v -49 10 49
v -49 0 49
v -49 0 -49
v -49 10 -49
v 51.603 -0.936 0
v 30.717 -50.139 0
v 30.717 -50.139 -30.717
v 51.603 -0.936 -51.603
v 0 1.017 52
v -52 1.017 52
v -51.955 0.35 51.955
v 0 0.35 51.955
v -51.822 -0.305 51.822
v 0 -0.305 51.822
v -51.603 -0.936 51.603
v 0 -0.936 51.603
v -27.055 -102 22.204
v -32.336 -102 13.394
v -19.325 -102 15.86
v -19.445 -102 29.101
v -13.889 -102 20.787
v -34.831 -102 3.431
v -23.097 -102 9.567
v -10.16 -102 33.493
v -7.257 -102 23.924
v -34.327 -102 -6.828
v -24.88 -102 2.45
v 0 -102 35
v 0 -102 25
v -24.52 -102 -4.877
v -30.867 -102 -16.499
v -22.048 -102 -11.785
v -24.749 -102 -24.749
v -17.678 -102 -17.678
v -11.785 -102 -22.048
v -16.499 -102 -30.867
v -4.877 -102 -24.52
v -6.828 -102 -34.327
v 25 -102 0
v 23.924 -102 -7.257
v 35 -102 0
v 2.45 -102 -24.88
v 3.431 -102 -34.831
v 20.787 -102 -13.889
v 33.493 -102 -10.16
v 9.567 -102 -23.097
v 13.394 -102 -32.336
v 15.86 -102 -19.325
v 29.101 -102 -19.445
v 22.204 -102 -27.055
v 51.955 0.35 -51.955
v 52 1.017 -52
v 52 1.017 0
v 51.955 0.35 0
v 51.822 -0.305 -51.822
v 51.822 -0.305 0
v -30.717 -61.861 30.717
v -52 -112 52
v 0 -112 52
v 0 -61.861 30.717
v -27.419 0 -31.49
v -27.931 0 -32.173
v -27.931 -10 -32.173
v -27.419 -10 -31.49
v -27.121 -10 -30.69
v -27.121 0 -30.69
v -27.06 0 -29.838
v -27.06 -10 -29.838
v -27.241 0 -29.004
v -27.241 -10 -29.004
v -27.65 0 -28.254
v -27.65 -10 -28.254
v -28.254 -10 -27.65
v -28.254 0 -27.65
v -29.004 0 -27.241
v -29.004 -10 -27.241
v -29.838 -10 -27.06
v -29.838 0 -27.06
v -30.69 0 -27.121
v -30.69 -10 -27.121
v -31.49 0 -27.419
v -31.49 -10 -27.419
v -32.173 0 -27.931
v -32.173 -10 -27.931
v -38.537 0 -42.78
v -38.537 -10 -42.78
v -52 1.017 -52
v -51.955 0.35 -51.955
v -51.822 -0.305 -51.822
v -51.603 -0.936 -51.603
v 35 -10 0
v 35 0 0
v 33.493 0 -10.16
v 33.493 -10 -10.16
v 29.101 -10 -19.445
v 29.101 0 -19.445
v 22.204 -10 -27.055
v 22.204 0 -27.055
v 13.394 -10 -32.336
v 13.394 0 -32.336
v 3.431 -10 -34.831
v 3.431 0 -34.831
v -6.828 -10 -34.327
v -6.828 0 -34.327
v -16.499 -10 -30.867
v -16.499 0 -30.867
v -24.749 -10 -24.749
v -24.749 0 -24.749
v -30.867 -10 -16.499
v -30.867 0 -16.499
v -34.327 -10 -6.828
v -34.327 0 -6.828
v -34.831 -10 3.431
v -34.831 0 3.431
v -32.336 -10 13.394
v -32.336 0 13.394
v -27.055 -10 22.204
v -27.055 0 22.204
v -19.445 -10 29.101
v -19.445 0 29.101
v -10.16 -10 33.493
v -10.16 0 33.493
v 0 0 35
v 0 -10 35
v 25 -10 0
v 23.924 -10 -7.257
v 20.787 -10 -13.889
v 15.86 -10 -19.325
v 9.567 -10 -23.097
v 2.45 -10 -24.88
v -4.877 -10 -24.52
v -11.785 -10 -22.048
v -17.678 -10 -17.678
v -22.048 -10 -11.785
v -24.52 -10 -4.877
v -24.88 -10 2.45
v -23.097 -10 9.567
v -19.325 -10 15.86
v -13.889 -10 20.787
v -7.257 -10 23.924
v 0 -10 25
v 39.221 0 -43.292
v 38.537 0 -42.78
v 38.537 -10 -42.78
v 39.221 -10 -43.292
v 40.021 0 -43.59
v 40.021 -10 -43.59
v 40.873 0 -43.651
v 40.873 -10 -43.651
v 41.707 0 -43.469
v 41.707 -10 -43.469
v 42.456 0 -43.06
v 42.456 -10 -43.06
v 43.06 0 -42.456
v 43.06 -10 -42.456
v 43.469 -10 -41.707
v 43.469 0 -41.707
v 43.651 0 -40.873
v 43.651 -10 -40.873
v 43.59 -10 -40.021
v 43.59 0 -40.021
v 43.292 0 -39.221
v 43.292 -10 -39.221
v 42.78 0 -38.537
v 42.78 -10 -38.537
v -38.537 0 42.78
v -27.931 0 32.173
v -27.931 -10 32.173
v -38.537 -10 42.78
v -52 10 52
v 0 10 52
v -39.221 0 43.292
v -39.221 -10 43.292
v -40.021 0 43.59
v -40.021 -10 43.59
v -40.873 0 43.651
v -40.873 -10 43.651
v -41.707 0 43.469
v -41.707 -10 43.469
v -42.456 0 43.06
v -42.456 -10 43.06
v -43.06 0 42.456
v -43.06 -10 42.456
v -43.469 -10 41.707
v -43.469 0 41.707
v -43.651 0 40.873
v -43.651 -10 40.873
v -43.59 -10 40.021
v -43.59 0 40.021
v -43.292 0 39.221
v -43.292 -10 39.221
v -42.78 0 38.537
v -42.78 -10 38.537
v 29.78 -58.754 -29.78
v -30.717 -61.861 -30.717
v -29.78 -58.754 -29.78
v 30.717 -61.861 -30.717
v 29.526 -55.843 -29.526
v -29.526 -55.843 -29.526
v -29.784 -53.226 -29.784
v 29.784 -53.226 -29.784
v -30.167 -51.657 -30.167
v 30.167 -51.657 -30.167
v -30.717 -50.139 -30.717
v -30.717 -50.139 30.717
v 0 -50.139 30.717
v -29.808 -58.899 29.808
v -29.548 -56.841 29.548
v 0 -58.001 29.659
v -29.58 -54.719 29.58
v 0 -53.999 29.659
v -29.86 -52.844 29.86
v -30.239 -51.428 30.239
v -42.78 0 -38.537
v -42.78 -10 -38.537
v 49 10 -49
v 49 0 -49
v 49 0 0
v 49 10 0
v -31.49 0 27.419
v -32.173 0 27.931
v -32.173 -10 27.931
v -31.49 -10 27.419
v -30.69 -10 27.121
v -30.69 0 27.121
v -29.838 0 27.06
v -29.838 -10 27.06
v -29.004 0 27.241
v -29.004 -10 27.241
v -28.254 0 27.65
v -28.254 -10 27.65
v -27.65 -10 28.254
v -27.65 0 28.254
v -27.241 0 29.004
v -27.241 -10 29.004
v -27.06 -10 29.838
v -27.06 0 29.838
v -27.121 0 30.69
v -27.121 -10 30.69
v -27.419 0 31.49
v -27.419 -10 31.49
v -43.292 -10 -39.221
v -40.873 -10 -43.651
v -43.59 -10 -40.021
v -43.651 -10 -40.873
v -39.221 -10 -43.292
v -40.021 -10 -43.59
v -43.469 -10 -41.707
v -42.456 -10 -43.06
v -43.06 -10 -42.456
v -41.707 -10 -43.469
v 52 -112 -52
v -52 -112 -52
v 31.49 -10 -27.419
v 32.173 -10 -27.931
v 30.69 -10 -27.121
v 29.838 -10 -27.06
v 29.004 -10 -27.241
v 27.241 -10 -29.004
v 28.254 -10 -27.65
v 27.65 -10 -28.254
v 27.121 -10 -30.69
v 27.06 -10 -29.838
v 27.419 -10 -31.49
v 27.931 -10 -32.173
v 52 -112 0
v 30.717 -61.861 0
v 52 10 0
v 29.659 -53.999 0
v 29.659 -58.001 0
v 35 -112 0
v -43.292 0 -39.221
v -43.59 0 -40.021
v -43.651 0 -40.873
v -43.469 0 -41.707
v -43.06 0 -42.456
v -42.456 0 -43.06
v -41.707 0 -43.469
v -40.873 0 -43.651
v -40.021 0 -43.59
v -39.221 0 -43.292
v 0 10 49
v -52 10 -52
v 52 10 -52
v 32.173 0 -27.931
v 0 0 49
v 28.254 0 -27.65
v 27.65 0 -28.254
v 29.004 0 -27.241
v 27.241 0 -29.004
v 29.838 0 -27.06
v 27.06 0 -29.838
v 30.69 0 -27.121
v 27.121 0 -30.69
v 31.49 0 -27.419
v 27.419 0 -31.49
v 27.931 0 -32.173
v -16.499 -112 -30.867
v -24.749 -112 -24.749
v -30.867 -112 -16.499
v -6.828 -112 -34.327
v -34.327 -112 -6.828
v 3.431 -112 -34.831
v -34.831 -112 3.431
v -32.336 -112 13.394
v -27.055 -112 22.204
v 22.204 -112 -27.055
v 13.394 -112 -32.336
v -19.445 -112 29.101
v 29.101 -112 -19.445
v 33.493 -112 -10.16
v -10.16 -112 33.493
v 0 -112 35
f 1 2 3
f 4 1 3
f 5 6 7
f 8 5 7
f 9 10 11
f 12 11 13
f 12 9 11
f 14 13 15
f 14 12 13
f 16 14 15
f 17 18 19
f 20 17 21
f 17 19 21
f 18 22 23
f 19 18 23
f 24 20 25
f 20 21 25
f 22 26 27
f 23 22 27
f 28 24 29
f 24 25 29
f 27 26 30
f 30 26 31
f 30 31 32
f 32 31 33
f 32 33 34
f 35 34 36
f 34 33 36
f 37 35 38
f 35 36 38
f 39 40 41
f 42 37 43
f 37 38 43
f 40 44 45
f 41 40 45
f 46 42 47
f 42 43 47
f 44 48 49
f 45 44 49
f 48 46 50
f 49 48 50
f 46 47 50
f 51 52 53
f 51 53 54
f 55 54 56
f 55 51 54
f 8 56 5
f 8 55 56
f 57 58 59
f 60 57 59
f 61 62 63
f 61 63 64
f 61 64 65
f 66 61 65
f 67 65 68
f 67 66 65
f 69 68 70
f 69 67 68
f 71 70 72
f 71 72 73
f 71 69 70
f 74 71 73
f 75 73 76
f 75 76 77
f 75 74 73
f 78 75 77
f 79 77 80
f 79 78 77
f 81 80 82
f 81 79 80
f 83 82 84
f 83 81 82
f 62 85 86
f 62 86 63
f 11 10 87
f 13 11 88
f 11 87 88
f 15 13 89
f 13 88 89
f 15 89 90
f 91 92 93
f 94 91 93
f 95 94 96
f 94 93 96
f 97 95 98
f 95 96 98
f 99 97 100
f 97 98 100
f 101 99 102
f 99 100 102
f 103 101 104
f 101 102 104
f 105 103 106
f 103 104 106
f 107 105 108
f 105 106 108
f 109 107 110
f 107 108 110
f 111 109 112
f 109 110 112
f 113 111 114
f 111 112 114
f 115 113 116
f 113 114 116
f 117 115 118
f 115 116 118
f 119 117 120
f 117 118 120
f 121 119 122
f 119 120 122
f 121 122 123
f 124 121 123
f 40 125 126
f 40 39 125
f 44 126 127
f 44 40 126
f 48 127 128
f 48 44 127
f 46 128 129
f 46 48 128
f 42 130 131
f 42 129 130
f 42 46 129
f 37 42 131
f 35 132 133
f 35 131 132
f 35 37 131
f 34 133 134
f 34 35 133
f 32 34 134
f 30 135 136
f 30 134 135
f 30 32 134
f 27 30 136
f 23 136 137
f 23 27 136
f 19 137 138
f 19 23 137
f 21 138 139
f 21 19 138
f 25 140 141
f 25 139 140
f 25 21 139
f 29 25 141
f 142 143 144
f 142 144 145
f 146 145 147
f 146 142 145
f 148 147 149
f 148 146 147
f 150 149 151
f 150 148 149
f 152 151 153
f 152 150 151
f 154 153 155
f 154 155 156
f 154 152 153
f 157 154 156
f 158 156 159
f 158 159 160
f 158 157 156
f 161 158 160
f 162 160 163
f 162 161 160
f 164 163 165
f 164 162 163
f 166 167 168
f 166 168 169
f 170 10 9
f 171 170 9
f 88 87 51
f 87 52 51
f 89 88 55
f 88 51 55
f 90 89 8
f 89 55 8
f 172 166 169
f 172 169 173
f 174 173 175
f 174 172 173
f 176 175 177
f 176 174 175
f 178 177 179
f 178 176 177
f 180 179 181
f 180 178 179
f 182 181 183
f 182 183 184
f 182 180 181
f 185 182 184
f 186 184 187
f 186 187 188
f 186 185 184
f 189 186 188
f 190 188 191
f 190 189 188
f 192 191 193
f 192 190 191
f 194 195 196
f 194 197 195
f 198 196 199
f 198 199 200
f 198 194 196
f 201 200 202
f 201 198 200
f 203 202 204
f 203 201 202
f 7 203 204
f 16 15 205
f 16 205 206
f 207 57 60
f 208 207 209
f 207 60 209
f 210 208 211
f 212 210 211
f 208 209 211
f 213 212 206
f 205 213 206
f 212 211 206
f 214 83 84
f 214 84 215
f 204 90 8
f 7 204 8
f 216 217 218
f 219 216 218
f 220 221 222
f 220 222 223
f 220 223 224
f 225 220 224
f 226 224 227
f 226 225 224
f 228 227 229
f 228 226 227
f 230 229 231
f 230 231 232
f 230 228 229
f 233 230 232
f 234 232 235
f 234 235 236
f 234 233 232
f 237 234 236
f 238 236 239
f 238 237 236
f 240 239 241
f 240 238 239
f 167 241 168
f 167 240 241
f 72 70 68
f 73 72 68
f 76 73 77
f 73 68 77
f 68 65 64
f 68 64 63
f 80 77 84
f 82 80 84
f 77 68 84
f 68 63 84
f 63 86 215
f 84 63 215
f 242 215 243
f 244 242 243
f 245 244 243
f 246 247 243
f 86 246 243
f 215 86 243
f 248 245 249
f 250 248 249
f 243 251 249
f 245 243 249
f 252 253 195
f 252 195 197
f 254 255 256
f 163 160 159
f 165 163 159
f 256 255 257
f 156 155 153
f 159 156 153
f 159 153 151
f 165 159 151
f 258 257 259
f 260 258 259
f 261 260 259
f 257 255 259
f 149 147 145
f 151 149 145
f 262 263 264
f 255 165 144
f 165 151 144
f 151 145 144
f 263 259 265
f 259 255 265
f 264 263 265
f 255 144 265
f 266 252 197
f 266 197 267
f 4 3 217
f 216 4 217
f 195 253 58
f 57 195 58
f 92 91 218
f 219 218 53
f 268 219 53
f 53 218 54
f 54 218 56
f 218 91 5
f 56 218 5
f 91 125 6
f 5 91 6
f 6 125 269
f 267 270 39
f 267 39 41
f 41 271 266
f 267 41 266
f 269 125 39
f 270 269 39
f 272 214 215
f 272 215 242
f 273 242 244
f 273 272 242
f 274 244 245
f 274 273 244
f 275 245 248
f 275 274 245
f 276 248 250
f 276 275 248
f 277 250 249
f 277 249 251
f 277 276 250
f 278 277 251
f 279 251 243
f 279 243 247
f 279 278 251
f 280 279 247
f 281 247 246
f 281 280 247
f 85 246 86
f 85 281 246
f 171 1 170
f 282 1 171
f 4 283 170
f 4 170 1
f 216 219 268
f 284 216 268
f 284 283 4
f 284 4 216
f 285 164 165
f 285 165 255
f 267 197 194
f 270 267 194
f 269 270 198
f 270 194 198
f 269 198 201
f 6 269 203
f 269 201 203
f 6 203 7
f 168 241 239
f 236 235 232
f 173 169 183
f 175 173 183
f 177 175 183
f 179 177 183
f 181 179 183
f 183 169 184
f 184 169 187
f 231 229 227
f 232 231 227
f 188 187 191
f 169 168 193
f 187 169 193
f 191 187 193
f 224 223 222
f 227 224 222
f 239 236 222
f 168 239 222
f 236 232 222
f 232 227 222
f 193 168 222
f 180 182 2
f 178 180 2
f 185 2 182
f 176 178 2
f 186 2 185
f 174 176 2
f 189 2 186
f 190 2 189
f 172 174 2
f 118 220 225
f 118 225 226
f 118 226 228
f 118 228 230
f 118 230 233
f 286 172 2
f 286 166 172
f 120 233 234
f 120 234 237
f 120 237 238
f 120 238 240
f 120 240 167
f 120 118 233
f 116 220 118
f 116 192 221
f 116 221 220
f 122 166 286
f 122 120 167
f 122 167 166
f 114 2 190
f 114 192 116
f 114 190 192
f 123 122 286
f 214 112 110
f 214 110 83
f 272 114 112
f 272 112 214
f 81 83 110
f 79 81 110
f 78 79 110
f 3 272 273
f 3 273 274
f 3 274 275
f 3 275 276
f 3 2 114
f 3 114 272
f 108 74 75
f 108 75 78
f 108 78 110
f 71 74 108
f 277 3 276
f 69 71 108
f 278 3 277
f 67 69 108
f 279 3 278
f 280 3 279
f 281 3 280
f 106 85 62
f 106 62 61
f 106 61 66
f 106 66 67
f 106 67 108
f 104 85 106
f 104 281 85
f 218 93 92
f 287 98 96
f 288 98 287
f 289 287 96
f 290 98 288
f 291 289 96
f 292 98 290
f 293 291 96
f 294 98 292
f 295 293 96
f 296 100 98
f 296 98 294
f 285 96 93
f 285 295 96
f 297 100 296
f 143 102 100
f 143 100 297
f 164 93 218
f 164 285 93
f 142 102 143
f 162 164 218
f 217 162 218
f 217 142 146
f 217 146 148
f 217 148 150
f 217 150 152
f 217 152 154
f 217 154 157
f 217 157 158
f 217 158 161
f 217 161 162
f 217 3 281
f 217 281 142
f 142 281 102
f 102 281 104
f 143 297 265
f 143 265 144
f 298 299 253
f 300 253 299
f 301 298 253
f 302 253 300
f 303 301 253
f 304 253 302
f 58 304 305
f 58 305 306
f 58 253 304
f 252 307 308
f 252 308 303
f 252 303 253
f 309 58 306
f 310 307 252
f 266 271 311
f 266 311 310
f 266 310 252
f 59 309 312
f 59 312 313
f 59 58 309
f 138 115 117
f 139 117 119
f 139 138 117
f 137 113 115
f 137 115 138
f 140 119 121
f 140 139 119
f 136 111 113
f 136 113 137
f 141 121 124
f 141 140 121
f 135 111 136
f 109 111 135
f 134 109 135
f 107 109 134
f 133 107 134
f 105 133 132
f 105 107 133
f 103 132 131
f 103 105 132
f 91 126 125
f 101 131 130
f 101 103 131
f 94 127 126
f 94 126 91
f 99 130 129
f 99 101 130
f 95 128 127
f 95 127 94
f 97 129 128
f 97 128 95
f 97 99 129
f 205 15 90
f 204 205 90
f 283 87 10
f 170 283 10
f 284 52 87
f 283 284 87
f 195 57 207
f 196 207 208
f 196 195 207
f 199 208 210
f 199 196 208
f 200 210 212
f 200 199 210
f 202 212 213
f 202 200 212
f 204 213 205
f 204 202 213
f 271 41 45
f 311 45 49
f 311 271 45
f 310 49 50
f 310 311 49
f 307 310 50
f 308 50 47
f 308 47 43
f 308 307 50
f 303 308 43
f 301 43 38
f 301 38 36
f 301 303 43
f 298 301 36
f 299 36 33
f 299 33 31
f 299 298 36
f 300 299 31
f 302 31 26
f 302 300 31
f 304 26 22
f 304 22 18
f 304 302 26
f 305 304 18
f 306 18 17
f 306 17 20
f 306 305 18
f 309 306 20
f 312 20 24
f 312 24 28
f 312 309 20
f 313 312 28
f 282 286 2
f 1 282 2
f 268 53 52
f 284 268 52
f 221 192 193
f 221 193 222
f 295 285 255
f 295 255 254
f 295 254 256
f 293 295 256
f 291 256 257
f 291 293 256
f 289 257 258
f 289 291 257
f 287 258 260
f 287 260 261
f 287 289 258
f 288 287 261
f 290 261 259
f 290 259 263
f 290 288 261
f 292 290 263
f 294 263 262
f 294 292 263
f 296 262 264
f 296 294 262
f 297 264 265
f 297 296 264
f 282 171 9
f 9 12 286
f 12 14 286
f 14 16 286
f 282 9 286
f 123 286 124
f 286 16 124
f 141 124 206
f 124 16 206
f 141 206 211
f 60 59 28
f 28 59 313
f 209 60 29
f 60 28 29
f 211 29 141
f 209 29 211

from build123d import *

# Parameters (mm, degrees)
ESQUISSE1_W                  = 104
ESQUISSE1_H                  = 104
BOSS_EXTRU_2_DEPTH           = 56
BOSS_EXTRU_2_DRAFT           = -23
SYM_TRIE1_COPY_1_SKETCH_W    = 104
SYM_TRIE1_COPY_1_SKETCH_H    = 104
SYM_TRIE1_COPY_1_DEPTH       = 56
SYM_TRIE1_COPY_1_DRAFT       = -23
ENL_V_MAT_EXTRU_1_DEPTH      = 134.985073796
ENL_V_MAT_EXTRU_1_DEPTH_BACK = 134.985073796
ESQUISSE2_R                  = 25
CONG_1_R                     = 15
ESQUISSE3_W                  = 52
ESQUISSE3_H                  = 52
ENL_V_MAT_EXTRU_2_DEPTH      = 134.985073796
ESQUISSE4_R                  = 35
ENL_V_MAT_EXTRU_3_DEPTH      = 10
BOSS_EXTRU_3_DEPTH           = 10
CONG_2_R                     = 5
ENL_V_MAT_EXTRU_4_DEPTH      = 10


with BuildPart() as part:
    # Esquisse1 → Boss.-Extru.2 (with draft: the straight prism first)
    with BuildSketch(Plane(origin=(0, 0, 0), x_dir=(1, 0, 0), z_dir=(0, 1, 0))):
        Rectangle(ESQUISSE1_W, ESQUISSE1_H)
    extrude(amount=-BOSS_EXTRU_2_DEPTH)
    # Boss.-Extru.2: the draft: its side faces are tilted about the plane it starts from
    boss_extru_2_sides = [part.faces().sort_by_distance(p)[0] for p in [
        (-52, -28, 0),
        (0, -28, 52),
        (52, -28, 0),
        (0, -28, -52),
    ]]
    draft(boss_extru_2_sides, Plane(origin=(0, 0, 0), x_dir=(1, 0, 0), z_dir=(0, 1, 0)), BOSS_EXTRU_2_DRAFT)


with BuildPart() as sym_trie1_copy_1_tool:
    # Symétrie1 copy 1 sketch → Symétrie1 copy 1 (with draft: the straight prism first)
    with BuildSketch(Plane.XZ.offset(112)):
        Rectangle(SYM_TRIE1_COPY_1_SKETCH_W, SYM_TRIE1_COPY_1_SKETCH_H)
    extrude(amount=-SYM_TRIE1_COPY_1_DEPTH)
    # Symétrie1 copy 1: the draft: its side faces are tilted about the plane it starts from
    sym_trie1_copy_1_sides = [sym_trie1_copy_1_tool.faces().sort_by_distance(p)[0] for p in [
        (-52, -84, 0),
        (0, -84, 52),
        (52, -84, 0),
        (0, -84, -52),
    ]]
    draft(sym_trie1_copy_1_sides, Plane.XZ.offset(112), SYM_TRIE1_COPY_1_DRAFT)


with BuildPart() as part_1:
    add(part.part)

    # Symétrie1 copy 1: add sym_trie1_copy_1_tool
    add(sym_trie1_copy_1_tool.part)

    # Esquisse2 → Enlèv. mat.-Extru.1 (cut, two sides: drawn at the far end of the back side and taken through both)
    with BuildSketch(Plane(origin=(0, 0, 0), x_dir=(1, 0, 0), z_dir=(0, 1, 0)).offset(-ENL_V_MAT_EXTRU_1_DEPTH_BACK)):
        with Locations(Location((0, 0, 0), (0, 0, 270))):
            Circle(ESQUISSE2_R)
    extrude(amount=ENL_V_MAT_EXTRU_1_DEPTH + ENL_V_MAT_EXTRU_1_DEPTH_BACK, mode=Mode.SUBTRACT)

    # Congé1
    cong_1_edges = [part_1.edges().sort_by_distance(p)[0] for p in [
        (-28.229410292, -56, 0),
        (0, -56, 28.229410292),
        (28.229410292, -56, 0),
        (0, -56, -28.229410292),
    ]]
    fillet(cong_1_edges, radius=CONG_1_R)

    # Esquisse3 → Enlèv. mat.-Extru.2 (cut, through all)
    with BuildSketch(Plane(origin=(0, 0, 0), x_dir=(1, 0, 0), z_dir=(0, 1, 0))):
        with Locations((26, -26)):
            Rectangle(ESQUISSE3_W, ESQUISSE3_H)
    extrude(amount=-ENL_V_MAT_EXTRU_2_DEPTH, mode=Mode.SUBTRACT)

    # Esquisse4 → Enlèv. mat.-Extru.3 (cut)
    with BuildSketch(Plane(origin=(0, 0, 0), x_dir=(1, 0, 0), z_dir=(0, 1, 0))):
        Circle(ESQUISSE4_R)
    enl_v_mat_extru_3 = extrude(amount=-ENL_V_MAT_EXTRU_3_DEPTH, mode=Mode.SUBTRACT)

    # Symétrie2: Enlèv. mat.-Extru.3 across plane
    add(enl_v_mat_extru_3.mirror(Plane.ZX.offset(-56)), mode=Mode.SUBTRACT)

    # Esquisse7 → Boss.-Extru.3 (add)
    with BuildSketch(Plane(origin=(0, 0, 0), x_dir=(1, 0, 0), z_dir=(0, 1, 0))):
        Polygon((-52, -52), (0, -52), (0, -49), (-49, -49), (-49, 49), (49, 49), (49, 0), (52, 0), (52, 52), (-52, 52), align=None)
    extrude(amount=BOSS_EXTRU_3_DEPTH)

    # Congé2
    cong_2_edges = [part_1.edges().sort_by_distance(p)[0] for p in [
        (-26, 0, 52),
        (-52, 0, 0),
        (0, 0, -52),
        (52, 0, -26),
    ]]
    fillet(cong_2_edges, radius=CONG_2_R)

    # Esquisse8 → Enlèv. mat.-Extru.4 (cut)
    with BuildSketch(Plane(origin=(0, 0, 0), x_dir=(1, 0, 0), z_dir=(0, 1, 0))):
        with BuildLine():
            Line((-38.537319575, 42.779960262), (-27.930717857, 32.173358544))
            ThreePointArc((-27.930717857, 32.173358544), (-27.930717857, 27.930717857), (-32.173358544, 27.930717857))
            Line((-32.173358544, 27.930717857), (-42.779960262, 38.537319575))
            ThreePointArc((-42.779960262, 38.537319575), (-42.779960262, 42.779960262), (-38.537319575, 42.779960262))
        make_face()
        with BuildLine():
            Line((42.779960262, 38.537319575), (32.173358544, 27.930717857))
            ThreePointArc((32.173358544, 27.930717857), (27.930717857, 27.930717857), (27.930717857, 32.173358544))
            Line((27.930717857, 32.173358544), (38.537319575, 42.779960262))
            ThreePointArc((38.537319575, 42.779960262), (42.779960262, 42.779960262), (42.779960262, 38.537319575))
        make_face()
        with BuildLine():
            Line((38.537319575, -42.779960262), (27.930717857, -32.173358544))
            ThreePointArc((27.930717857, -32.173358544), (27.930717857, -27.930717857), (32.173358544, -27.930717857))
            Line((32.173358544, -27.930717857), (42.779960262, -38.537319575))
            ThreePointArc((42.779960262, -38.537319575), (42.779960262, -42.779960262), (38.537319575, -42.779960262))
        make_face()
        with BuildLine():
            Line((-42.779960262, -38.537319575), (-32.173358544, -27.930717857))
            ThreePointArc((-32.173358544, -27.930717857), (-27.930717857, -27.930717857), (-27.930717857, -32.173358544))
            Line((-27.930717857, -32.173358544), (-38.537319575, -42.779960262))
            ThreePointArc((-38.537319575, -42.779960262), (-42.779960262, -42.779960262), (-42.779960262, -38.537319575))
        make_face()
    extrude(amount=-ENL_V_MAT_EXTRU_4_DEPTH, mode=Mode.SUBTRACT)


solid = part_1.part
